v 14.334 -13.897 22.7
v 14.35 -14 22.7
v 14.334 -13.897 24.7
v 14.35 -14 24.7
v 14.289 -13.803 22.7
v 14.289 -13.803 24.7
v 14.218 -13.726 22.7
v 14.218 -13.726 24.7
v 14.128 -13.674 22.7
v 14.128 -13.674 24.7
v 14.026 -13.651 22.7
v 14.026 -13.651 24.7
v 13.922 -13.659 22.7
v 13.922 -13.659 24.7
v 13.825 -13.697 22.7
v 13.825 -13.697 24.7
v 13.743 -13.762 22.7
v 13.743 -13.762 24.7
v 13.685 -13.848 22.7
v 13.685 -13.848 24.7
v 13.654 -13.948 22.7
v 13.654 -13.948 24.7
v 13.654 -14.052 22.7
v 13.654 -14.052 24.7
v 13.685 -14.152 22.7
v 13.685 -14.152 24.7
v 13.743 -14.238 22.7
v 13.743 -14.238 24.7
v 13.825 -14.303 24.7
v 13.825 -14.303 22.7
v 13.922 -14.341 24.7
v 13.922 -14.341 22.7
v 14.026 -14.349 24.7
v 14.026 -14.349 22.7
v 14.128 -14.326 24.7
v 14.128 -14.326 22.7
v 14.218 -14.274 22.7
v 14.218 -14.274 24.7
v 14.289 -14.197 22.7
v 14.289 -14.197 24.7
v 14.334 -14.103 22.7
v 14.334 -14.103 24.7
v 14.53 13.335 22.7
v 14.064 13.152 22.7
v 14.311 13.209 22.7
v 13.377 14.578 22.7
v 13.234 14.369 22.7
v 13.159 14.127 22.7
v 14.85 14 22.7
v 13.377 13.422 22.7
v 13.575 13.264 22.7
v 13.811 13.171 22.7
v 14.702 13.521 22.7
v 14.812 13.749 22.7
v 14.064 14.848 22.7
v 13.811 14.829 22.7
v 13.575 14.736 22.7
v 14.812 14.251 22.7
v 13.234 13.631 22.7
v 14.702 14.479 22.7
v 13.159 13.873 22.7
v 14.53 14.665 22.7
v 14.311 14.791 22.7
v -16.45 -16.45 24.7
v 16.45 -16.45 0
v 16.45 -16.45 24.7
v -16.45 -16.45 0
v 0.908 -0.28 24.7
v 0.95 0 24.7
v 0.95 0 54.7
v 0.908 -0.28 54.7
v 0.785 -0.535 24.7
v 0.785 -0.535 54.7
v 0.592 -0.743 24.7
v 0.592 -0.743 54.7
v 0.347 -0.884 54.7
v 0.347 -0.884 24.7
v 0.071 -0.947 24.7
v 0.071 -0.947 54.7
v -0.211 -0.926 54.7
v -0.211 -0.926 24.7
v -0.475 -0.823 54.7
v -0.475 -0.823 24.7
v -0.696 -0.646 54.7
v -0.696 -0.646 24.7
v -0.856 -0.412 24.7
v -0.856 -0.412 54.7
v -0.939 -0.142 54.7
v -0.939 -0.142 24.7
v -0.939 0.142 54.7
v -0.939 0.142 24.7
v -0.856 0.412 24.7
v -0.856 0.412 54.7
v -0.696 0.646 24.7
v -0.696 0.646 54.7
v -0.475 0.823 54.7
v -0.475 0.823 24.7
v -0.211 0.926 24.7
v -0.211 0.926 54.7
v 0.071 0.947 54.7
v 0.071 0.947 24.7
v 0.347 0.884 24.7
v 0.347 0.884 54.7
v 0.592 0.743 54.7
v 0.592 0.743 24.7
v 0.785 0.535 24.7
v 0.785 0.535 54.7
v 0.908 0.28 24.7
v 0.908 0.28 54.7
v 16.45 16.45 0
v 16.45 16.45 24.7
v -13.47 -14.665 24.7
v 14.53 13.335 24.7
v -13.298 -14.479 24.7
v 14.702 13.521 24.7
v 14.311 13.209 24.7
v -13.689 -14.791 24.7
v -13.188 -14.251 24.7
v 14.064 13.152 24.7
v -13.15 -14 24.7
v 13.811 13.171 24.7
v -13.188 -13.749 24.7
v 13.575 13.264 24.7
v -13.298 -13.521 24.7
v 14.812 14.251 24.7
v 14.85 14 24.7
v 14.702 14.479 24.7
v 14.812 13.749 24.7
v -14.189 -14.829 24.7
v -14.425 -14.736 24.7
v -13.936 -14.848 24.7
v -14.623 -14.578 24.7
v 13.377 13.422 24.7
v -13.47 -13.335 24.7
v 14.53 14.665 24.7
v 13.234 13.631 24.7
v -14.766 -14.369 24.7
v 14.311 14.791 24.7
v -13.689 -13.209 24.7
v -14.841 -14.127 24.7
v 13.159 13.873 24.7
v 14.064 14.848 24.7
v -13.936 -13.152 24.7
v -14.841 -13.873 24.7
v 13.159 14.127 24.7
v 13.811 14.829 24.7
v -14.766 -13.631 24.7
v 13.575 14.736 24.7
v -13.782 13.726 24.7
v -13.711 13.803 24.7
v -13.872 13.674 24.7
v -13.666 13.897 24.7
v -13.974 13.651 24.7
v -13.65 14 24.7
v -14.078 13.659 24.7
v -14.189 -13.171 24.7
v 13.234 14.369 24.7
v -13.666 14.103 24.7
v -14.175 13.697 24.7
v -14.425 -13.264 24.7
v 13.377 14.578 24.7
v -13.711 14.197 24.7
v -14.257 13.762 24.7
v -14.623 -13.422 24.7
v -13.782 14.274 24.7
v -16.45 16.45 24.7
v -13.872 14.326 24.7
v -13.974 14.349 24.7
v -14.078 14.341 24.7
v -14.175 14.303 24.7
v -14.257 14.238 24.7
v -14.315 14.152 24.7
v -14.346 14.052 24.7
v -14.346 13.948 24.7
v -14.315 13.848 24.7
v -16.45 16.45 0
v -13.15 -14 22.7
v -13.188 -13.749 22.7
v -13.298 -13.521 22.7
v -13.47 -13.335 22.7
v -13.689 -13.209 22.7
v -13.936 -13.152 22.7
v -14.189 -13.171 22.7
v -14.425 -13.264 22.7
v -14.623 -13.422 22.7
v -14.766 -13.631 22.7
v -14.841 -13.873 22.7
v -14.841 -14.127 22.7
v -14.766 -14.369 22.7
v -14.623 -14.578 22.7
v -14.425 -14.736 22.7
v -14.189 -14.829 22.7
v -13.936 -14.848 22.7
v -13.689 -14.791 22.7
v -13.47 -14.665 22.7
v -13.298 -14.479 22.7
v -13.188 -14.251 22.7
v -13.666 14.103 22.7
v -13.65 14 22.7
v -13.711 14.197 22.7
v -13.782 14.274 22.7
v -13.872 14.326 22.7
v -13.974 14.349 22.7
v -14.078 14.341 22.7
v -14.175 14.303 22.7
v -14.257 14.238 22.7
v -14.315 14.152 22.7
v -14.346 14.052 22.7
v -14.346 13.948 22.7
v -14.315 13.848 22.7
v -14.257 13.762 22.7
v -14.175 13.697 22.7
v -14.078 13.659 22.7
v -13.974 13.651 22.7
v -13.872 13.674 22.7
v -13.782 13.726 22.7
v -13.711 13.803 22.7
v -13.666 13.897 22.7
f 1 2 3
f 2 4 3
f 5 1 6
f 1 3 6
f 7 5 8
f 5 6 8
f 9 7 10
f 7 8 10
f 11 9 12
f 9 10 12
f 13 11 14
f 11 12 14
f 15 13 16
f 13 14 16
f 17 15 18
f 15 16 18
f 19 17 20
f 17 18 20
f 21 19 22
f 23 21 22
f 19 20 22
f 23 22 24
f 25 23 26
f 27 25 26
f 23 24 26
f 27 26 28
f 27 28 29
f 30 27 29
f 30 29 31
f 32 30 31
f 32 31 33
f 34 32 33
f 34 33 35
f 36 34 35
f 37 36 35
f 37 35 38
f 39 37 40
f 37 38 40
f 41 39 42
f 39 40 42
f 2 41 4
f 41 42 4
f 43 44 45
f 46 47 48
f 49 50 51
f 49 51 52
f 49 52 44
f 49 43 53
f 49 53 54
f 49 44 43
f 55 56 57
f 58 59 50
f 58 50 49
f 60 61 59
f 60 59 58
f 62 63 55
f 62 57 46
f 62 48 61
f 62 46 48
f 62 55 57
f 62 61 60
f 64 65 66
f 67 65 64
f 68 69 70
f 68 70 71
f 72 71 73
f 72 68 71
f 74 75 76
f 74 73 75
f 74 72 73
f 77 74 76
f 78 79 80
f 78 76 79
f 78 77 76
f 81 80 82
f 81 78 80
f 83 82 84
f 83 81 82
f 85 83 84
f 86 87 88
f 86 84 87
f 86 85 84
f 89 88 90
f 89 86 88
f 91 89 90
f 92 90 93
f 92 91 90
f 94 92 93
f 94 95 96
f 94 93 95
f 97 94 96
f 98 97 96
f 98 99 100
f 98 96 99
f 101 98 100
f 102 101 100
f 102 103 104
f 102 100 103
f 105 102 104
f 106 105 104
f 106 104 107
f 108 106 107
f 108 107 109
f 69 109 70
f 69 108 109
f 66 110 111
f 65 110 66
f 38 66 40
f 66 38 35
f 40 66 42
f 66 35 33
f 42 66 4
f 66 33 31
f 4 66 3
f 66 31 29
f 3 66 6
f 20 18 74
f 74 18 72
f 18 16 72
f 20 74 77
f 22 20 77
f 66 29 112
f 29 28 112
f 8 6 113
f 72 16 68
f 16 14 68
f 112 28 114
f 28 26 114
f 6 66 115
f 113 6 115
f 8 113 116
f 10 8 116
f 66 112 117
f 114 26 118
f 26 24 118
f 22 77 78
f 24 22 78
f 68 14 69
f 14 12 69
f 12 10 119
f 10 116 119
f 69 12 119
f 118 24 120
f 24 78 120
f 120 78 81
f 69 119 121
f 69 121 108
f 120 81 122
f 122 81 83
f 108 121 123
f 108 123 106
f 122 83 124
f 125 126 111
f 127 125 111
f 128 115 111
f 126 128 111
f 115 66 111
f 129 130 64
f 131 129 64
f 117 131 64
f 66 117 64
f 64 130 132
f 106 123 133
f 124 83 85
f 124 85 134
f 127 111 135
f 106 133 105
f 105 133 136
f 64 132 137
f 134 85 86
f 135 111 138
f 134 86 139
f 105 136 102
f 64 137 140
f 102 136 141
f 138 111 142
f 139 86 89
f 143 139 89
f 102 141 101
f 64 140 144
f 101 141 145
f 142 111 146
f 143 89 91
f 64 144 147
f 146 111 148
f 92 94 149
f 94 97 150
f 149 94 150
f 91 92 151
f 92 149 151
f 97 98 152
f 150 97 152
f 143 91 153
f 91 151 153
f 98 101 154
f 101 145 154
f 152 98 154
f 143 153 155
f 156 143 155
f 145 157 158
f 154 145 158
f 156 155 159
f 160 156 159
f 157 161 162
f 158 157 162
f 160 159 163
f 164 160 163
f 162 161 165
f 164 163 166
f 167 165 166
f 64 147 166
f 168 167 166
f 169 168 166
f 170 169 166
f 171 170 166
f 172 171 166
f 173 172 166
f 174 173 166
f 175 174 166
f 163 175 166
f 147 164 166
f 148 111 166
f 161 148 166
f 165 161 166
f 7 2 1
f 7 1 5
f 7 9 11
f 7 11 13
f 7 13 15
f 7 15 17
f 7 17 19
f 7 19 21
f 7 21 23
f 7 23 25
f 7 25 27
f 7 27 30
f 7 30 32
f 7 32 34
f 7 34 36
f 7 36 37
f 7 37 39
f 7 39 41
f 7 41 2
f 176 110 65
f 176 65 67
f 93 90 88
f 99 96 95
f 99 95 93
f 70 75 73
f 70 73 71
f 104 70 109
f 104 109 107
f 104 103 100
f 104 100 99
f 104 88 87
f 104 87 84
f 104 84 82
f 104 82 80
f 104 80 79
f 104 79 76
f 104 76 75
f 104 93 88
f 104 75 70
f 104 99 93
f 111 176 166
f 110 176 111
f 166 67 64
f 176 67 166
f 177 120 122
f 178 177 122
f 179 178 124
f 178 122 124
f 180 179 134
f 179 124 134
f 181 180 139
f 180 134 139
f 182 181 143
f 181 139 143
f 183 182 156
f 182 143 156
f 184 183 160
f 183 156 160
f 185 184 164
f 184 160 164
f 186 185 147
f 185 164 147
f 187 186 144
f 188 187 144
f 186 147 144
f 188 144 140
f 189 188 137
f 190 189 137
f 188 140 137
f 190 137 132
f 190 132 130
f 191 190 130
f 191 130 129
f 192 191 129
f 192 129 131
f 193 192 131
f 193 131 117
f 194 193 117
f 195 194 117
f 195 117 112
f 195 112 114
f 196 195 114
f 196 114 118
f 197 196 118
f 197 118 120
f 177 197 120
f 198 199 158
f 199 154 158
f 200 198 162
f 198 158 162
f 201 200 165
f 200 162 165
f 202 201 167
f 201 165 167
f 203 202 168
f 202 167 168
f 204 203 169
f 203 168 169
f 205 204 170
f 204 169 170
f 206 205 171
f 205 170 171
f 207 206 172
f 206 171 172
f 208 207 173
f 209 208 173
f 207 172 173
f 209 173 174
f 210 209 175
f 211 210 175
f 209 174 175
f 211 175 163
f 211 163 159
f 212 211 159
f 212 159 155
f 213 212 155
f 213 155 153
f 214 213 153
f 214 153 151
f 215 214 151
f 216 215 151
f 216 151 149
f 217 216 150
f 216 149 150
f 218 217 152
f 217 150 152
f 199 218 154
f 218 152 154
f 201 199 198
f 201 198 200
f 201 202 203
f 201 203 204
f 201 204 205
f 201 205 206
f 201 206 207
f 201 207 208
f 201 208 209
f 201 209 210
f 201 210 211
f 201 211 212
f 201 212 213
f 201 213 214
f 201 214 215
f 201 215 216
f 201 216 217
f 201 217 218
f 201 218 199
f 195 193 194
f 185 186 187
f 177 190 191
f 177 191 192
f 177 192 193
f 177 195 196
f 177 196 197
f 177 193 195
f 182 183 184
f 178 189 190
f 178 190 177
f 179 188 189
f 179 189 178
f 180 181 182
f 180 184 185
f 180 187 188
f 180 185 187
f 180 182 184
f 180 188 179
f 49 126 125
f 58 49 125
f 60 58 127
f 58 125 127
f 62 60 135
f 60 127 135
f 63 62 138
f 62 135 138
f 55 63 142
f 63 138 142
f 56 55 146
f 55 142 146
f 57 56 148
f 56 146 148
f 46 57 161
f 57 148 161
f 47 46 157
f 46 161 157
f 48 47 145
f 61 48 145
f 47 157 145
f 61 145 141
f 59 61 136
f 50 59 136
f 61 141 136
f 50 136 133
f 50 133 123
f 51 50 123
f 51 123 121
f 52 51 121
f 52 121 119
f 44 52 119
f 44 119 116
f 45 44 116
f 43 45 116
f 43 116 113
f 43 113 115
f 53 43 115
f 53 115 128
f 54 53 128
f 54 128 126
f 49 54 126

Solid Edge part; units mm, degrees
sketch "Sketch1" plane through (0, 0, 0) normal (0, 0, 1) x (1, 0, 0)
  line L0 (16.45, -16.45) -> (-16.45, -16.45)
  line L1 (-16.45, -16.45) -> (-16.45, 16.45)
  line L2 (-16.45, 16.45) -> (16.45, 16.45)
  line L3 (16.45, 16.45) -> (16.45, -16.45)
extrude "Protrusion1" add sketch "Sketch1" along normal blind 24.7
sketch "Sketch2" plane through (0, 0, 24.7) normal (0, 0, 1) x (1, 0, 0)
  circle A0 centre (-14, 14) radius 0.35
  circle A1 centre (14, 14) radius 0.85
  circle A2 centre (-14, -14) radius 0.85
  circle A3 centre (14, -14) radius 0.35
  dimension "D1" = 26.8
extrude "ExtrudedCutout_1" cut sketch "Sketch2" against normal blind 2
sketch "Sketch3" plane through (0, 0, 24.7) normal (0, 0, 1) x (1, 0, 0)
  circle A0 centre (0, 0) radius 0.95
extrude "ExtrudedProtrusion_2" add sketch "Sketch3" along normal blind 30
